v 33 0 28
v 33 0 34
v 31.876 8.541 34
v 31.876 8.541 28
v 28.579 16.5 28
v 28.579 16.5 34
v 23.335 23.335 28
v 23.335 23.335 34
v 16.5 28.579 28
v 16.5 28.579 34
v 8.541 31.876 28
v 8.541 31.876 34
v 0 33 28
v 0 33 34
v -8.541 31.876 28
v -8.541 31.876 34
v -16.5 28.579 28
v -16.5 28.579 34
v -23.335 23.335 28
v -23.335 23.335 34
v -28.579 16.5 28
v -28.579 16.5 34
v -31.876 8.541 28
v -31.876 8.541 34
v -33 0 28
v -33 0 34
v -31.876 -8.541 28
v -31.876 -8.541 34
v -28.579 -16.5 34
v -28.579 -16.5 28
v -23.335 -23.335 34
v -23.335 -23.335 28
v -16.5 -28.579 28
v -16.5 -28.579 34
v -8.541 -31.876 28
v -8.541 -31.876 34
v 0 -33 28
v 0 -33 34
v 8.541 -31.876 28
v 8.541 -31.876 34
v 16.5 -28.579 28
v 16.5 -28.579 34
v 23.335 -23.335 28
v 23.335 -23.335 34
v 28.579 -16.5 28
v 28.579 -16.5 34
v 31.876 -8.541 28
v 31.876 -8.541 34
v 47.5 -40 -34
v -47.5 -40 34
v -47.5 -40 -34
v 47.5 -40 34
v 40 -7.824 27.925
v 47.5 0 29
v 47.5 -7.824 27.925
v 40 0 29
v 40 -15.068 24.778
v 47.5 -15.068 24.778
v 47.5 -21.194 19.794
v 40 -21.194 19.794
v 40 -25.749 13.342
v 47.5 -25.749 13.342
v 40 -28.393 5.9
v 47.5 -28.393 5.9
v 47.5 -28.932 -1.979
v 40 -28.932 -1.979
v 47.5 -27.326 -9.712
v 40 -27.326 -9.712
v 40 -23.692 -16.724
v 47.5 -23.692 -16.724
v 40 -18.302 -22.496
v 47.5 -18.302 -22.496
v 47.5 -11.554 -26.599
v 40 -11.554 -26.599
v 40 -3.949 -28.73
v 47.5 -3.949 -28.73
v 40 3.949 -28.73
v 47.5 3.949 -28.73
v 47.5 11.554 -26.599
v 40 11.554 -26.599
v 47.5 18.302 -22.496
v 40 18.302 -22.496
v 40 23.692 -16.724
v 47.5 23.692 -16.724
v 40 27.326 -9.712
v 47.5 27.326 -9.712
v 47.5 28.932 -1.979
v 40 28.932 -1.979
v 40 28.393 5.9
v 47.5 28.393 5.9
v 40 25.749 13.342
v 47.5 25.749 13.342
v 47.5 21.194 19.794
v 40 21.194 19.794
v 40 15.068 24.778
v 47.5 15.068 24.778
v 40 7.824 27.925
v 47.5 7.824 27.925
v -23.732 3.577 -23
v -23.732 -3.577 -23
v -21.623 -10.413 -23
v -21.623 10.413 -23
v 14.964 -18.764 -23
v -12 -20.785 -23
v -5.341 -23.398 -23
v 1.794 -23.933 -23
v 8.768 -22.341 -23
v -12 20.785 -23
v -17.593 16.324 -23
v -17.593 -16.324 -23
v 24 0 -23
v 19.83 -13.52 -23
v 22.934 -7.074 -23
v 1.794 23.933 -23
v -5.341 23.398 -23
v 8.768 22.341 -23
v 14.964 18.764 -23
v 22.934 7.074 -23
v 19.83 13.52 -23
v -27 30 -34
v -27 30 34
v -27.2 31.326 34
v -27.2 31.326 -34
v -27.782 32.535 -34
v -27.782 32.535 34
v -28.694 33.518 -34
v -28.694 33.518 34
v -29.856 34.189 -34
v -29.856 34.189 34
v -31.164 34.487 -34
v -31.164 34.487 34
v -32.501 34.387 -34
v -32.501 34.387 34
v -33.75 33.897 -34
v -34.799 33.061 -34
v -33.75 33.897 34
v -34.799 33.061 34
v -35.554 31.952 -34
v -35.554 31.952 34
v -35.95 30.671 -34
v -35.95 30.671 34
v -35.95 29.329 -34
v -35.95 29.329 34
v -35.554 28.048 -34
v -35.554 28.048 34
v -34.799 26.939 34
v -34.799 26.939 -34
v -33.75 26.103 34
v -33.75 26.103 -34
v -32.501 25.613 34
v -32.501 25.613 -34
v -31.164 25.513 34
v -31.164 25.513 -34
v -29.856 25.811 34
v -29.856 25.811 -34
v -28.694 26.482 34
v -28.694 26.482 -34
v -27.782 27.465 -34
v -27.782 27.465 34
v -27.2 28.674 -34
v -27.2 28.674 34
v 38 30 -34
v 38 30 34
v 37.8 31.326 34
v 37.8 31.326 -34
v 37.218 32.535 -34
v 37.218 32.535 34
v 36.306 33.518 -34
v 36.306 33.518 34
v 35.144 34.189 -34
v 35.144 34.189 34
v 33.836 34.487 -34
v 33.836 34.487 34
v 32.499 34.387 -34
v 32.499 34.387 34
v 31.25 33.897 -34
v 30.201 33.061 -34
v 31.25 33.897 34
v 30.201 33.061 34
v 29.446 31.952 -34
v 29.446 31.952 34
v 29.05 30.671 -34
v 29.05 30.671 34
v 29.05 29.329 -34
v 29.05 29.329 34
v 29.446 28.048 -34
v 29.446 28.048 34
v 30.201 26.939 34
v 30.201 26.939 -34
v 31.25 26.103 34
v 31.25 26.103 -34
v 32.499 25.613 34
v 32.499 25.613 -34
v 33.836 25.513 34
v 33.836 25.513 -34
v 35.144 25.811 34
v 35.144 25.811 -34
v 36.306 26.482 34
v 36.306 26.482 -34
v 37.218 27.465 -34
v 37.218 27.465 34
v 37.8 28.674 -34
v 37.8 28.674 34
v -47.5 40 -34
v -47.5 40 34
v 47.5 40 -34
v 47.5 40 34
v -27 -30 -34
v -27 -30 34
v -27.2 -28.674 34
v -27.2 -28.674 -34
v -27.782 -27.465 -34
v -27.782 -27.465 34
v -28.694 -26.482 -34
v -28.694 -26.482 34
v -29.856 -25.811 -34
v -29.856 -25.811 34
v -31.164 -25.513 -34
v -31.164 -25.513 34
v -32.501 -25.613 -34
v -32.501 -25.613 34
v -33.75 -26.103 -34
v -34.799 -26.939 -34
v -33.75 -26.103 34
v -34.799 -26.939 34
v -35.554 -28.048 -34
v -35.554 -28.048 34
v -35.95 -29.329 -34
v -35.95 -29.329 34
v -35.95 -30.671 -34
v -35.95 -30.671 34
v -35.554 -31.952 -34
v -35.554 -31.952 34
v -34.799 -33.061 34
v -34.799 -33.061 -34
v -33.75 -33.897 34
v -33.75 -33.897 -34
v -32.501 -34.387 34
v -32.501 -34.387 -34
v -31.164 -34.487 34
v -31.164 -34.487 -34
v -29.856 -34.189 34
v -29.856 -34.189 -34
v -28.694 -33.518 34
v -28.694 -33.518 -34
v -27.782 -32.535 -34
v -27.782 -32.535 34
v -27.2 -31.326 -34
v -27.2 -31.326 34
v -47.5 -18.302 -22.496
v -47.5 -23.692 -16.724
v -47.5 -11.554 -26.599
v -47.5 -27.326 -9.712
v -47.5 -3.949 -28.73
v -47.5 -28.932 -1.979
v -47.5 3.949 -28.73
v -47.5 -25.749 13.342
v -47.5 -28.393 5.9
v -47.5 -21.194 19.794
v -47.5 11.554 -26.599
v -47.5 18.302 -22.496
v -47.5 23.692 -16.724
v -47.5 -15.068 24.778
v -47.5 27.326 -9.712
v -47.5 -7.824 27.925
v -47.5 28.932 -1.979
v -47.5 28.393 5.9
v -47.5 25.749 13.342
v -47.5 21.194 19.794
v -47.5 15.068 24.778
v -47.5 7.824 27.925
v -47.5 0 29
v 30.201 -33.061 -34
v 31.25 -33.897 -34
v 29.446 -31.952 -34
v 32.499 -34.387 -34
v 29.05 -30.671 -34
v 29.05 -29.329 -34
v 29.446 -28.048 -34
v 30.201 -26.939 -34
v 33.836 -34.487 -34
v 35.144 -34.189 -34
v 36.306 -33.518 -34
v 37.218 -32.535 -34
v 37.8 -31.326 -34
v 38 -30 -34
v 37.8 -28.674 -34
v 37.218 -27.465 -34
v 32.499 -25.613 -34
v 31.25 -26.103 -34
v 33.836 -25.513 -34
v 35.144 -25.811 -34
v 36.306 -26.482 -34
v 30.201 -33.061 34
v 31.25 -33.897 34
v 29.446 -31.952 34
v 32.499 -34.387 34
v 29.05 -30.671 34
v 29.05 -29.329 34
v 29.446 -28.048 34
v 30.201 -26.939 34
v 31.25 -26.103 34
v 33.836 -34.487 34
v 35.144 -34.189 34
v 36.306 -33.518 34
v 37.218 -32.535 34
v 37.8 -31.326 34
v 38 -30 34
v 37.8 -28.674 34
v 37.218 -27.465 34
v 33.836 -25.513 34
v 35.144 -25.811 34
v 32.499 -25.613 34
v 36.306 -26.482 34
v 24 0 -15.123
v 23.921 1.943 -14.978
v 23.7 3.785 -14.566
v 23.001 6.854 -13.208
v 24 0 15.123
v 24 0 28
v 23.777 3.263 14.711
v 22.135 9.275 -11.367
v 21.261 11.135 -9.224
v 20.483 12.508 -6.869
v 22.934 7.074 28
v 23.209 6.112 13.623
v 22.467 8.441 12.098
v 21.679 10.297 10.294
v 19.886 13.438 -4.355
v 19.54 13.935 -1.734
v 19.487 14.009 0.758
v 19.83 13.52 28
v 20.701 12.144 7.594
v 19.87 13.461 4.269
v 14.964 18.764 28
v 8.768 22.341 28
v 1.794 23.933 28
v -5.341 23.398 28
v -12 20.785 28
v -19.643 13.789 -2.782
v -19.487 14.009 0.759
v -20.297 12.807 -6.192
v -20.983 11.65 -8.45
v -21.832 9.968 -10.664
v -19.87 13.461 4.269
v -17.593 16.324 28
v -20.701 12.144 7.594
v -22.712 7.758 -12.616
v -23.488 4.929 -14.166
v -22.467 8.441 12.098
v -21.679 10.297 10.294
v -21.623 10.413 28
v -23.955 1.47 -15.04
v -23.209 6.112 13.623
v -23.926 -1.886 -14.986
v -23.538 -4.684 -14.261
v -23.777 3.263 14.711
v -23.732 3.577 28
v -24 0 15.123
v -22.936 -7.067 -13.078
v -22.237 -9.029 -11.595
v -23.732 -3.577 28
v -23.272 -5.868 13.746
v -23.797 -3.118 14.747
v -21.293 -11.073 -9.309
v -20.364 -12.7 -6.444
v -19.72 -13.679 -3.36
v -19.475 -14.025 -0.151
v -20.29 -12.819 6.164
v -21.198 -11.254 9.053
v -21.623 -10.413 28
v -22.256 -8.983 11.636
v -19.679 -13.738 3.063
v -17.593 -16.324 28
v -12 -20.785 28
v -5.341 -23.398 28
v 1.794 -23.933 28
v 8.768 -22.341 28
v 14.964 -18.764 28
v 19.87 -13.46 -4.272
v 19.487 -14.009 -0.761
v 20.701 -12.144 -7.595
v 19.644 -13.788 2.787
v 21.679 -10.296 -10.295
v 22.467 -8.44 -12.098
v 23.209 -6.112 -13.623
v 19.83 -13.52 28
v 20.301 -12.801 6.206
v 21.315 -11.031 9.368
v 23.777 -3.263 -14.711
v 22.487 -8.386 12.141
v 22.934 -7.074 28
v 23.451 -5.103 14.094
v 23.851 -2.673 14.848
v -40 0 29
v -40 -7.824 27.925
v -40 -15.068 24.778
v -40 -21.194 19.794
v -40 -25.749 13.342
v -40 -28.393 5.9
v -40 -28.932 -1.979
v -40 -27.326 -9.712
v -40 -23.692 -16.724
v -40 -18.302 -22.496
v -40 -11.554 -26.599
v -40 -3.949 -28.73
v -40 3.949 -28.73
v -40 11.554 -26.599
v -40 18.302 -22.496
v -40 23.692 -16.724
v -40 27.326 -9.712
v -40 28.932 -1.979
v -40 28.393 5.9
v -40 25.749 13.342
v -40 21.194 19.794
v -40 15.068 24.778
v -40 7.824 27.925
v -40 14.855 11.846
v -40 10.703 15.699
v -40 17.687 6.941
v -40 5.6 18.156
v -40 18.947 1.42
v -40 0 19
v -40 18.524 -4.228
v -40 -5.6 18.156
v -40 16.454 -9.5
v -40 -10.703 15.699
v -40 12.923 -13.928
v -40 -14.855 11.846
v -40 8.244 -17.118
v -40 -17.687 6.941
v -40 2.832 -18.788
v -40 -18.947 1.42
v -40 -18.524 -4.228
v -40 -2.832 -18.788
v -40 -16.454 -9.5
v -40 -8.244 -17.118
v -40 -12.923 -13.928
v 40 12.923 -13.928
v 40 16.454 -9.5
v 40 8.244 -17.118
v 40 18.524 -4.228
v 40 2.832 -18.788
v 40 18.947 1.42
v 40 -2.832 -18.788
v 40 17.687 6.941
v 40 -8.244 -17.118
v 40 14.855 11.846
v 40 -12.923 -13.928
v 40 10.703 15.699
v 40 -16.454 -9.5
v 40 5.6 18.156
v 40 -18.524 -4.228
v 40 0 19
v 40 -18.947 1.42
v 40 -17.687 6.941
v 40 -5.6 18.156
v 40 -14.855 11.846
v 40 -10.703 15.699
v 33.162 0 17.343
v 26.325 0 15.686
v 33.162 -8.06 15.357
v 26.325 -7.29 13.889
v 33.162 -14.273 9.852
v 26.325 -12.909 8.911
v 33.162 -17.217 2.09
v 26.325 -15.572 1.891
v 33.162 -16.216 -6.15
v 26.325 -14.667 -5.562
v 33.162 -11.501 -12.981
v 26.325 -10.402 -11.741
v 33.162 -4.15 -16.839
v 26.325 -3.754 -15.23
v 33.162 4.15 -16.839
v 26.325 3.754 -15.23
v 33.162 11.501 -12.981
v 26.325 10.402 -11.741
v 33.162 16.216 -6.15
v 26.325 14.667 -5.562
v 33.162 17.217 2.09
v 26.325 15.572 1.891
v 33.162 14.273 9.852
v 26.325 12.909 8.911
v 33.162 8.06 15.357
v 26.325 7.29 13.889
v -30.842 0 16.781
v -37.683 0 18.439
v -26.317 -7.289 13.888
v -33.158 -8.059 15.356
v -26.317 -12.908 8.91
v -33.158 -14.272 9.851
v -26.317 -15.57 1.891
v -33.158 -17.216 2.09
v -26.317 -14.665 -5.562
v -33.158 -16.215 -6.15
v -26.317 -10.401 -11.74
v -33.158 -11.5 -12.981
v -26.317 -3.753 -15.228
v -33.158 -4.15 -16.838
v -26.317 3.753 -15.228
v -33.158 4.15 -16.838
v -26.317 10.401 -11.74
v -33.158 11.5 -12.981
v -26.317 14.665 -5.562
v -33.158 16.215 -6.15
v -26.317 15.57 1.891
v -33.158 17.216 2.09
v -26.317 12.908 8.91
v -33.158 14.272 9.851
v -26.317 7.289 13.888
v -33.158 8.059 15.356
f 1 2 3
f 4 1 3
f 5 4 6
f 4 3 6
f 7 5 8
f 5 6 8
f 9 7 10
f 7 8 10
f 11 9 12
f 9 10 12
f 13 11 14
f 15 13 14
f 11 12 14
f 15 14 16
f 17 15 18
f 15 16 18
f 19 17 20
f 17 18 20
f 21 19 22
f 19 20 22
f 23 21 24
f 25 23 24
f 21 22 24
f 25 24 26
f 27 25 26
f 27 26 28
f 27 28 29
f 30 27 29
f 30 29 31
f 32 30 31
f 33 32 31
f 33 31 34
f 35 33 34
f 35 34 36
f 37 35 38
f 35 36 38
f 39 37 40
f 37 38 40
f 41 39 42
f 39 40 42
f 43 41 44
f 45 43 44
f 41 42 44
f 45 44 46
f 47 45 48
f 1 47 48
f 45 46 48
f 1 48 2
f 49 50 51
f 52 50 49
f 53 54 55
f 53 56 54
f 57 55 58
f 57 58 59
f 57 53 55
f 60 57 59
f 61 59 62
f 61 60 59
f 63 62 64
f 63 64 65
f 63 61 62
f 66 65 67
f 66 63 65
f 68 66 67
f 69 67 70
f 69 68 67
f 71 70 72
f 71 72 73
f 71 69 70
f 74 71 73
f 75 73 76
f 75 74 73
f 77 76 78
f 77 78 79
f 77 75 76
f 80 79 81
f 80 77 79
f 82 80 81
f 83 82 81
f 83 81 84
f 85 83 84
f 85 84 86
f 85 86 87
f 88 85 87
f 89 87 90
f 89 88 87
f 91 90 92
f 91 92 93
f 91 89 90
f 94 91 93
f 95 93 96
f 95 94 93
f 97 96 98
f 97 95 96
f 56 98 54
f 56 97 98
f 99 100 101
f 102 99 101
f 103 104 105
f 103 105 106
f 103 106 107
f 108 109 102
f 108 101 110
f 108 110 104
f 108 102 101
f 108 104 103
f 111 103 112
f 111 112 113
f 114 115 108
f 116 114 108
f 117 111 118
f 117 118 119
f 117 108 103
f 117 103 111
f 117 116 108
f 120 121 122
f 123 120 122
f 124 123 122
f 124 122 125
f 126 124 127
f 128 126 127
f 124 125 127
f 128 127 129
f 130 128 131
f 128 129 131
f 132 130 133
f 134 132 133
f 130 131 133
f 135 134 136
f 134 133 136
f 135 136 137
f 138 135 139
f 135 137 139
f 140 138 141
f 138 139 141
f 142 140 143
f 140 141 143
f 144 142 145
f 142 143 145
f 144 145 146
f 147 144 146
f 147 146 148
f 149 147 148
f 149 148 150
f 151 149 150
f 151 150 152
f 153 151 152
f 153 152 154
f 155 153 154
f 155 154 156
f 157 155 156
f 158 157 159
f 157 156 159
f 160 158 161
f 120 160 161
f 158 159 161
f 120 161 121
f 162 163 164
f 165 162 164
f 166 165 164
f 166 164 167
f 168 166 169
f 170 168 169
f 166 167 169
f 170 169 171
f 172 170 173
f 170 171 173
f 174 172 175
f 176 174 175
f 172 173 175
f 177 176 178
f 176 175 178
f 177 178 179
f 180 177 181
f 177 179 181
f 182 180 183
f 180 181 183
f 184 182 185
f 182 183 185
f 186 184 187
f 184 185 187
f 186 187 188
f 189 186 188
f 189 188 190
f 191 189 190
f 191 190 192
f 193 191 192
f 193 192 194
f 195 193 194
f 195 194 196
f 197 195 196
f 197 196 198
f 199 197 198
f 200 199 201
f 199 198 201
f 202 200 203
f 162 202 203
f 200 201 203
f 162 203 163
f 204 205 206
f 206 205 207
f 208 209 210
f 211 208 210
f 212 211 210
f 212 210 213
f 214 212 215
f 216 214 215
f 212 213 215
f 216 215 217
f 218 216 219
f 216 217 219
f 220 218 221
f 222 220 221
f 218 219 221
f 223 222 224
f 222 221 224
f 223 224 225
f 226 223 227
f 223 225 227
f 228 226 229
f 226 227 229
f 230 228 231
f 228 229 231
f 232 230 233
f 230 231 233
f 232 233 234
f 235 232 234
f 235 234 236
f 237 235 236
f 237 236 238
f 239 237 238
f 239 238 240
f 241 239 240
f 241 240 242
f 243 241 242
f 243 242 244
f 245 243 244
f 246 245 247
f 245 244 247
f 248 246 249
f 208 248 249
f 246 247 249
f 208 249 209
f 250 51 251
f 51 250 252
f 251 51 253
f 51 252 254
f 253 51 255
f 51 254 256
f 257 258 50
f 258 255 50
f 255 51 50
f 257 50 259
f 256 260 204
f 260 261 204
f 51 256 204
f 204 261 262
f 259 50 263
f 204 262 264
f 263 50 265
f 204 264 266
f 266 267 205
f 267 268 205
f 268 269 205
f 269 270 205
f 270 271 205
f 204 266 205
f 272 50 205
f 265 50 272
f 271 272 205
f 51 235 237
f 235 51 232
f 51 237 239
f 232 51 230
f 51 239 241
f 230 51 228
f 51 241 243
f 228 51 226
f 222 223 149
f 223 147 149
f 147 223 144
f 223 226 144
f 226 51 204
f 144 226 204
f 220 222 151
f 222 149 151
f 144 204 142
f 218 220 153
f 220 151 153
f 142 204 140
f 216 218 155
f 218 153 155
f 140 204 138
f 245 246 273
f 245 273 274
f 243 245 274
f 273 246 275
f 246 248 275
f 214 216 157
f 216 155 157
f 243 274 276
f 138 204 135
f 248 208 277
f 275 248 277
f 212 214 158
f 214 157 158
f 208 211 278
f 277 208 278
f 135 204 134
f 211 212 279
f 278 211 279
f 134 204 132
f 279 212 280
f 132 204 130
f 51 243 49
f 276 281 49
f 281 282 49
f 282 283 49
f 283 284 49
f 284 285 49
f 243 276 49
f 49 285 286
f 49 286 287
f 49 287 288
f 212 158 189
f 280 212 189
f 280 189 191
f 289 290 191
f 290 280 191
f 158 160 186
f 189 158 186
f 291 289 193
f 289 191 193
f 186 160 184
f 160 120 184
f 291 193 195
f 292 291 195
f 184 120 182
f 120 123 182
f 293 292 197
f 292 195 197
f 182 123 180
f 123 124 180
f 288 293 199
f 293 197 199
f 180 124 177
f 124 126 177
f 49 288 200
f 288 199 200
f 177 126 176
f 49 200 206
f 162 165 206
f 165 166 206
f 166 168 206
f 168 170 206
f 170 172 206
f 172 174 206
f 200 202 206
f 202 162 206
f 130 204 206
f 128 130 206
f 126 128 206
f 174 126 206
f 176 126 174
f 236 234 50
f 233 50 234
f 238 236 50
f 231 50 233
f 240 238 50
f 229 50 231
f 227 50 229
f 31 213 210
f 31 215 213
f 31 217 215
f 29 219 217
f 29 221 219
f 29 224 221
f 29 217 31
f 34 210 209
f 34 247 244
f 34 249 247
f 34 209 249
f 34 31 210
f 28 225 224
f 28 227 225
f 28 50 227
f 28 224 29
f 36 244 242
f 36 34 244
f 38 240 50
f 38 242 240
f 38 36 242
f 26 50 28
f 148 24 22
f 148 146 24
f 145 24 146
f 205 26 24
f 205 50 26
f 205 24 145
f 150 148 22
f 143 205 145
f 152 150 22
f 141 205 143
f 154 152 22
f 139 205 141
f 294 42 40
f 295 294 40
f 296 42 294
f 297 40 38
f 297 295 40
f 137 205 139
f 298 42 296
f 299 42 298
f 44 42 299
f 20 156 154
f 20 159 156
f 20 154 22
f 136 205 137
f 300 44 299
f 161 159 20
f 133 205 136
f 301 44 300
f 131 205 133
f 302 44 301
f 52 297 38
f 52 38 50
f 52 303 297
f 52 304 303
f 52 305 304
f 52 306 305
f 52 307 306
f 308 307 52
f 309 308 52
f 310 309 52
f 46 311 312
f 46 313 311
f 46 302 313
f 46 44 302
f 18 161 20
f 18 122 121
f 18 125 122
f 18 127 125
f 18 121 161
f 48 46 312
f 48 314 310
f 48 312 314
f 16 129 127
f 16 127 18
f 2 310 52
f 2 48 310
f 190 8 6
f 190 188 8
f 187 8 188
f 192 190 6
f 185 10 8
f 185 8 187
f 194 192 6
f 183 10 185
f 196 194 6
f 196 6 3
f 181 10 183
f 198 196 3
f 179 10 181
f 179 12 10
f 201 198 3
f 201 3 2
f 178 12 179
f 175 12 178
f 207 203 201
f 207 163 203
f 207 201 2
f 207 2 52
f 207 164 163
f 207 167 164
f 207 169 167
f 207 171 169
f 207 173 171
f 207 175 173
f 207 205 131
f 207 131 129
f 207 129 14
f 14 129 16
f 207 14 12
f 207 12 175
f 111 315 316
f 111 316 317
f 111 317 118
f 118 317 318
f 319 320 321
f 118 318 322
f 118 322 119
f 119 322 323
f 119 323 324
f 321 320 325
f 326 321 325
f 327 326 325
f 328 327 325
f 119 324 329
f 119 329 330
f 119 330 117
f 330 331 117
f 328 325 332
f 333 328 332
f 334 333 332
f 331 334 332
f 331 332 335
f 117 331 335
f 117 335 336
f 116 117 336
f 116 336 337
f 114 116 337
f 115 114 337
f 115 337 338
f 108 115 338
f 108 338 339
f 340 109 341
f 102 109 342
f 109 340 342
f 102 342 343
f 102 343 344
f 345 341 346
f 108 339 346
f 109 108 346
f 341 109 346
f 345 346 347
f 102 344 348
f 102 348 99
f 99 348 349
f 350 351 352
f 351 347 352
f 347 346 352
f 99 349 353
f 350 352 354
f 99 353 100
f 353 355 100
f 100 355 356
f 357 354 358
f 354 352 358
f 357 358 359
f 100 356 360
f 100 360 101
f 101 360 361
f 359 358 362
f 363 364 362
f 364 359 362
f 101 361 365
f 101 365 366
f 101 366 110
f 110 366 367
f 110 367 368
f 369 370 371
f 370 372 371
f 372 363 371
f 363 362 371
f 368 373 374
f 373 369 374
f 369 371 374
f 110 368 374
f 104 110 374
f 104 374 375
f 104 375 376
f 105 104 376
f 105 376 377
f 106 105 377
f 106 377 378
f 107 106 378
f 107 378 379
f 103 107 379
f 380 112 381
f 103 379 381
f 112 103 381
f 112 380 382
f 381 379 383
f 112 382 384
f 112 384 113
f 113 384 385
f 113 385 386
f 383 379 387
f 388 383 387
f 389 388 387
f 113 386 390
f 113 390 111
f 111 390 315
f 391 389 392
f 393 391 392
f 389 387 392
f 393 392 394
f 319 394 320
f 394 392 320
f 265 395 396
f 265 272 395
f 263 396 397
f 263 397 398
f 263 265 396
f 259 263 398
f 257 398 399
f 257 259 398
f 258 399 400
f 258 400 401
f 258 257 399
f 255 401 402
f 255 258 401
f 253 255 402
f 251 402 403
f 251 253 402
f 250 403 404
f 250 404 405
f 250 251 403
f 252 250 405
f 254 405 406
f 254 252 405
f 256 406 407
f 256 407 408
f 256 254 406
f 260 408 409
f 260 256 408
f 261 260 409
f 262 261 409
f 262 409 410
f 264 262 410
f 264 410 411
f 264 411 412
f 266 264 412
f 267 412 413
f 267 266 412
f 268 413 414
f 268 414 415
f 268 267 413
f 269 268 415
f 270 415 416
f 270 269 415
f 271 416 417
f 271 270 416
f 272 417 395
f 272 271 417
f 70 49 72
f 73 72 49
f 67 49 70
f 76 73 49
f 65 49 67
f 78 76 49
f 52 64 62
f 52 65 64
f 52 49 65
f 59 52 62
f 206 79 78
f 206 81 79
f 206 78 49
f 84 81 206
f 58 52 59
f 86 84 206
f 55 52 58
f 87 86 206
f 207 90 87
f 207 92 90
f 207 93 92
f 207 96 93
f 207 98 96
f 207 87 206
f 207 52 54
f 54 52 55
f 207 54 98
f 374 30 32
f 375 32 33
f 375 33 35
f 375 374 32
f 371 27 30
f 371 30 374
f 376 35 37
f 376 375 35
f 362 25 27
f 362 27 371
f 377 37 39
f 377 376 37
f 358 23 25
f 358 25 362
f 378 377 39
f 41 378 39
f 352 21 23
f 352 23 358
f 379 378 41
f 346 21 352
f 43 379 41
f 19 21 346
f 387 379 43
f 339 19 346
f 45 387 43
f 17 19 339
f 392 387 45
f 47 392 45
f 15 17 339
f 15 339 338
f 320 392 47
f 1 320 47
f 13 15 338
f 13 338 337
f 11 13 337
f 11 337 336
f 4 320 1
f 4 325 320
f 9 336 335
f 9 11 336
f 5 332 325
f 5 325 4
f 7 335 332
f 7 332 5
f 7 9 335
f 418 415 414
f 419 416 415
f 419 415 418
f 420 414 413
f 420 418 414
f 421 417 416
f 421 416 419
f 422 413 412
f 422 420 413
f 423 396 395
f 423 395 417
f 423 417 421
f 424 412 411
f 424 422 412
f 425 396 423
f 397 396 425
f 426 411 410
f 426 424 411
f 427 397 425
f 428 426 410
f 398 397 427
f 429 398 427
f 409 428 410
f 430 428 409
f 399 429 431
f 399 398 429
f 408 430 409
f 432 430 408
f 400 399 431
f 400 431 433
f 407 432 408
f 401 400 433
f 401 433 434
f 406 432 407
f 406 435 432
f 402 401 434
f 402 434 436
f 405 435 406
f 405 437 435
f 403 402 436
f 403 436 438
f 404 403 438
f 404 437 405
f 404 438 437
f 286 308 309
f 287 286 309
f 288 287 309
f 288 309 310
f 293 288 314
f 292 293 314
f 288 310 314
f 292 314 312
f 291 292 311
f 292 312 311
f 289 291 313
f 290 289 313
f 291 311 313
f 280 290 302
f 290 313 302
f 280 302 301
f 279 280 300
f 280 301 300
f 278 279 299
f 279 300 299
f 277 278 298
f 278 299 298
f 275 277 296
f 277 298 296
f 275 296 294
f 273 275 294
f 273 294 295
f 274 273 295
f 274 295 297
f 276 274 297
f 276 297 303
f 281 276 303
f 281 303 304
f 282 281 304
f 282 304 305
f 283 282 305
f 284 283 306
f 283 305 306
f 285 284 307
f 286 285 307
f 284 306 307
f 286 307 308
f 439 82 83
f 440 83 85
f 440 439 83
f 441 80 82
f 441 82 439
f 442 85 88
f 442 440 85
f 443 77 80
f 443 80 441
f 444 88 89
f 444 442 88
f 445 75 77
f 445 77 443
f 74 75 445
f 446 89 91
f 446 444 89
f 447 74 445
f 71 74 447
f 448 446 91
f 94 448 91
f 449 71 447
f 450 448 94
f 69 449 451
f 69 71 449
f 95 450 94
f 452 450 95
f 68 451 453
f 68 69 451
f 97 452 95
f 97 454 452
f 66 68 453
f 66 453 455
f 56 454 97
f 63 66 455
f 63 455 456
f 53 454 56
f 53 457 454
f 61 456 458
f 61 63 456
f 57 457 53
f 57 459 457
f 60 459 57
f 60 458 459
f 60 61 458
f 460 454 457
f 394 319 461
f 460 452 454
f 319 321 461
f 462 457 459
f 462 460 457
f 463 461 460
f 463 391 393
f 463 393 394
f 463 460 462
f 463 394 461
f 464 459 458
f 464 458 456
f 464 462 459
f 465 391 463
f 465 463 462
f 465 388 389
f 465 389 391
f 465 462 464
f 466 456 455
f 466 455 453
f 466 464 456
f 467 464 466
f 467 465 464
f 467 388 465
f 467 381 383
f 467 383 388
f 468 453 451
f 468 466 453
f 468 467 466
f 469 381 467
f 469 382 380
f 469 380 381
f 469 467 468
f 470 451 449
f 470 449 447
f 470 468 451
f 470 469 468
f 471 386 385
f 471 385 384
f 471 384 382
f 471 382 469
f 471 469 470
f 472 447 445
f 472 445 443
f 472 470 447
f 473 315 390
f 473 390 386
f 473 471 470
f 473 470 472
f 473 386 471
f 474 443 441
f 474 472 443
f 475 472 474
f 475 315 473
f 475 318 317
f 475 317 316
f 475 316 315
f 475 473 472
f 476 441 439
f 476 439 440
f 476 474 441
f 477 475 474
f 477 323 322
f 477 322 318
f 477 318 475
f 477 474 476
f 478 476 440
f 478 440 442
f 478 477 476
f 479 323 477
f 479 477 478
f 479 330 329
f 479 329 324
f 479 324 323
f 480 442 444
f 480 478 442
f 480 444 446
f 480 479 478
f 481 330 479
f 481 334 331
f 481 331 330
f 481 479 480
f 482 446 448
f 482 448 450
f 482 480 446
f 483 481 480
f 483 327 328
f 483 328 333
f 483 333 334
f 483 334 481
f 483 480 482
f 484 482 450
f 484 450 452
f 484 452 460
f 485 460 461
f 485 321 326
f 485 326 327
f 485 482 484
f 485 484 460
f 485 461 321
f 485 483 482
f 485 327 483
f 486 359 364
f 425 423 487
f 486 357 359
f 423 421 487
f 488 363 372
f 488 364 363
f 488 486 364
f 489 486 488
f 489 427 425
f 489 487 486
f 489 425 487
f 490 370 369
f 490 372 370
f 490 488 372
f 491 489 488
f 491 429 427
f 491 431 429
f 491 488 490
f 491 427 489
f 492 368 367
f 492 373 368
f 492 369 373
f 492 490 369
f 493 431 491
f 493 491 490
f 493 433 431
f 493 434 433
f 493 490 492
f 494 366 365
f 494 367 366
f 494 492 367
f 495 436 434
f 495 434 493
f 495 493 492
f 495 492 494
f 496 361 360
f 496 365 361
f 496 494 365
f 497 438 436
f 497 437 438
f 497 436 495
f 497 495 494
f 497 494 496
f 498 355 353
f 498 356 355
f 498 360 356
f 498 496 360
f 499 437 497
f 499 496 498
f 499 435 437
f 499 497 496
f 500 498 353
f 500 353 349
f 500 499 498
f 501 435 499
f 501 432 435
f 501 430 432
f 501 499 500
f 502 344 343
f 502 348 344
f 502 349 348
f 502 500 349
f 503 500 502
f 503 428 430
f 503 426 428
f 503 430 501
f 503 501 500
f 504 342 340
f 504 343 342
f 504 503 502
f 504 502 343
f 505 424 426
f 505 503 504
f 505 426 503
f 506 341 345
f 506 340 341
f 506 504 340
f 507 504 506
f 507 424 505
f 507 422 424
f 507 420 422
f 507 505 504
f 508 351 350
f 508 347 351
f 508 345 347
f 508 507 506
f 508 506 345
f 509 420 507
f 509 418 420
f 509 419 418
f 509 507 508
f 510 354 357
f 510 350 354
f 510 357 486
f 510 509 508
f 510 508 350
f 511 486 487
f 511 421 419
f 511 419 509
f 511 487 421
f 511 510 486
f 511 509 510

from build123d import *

# Parameters (mm, degrees)
F0_W     = 95
F0_H     = 80
F1_DEPTH = 34
F4_R     = 4.5
F5_DEPTH = 68
F4_R_2   = 24
F6_DEPTH = 57
F4_R_3   = 33
F7_DEPTH = 6


with BuildPart() as f1:
    # F0 (on Top) → F1 (new body, symmetric)
    with BuildSketch(Plane.XY):
        Rectangle(F0_W, F0_H)
    extrude(amount=F1_DEPTH, both=True)

    # F2 (on Front) → F3 (revolve, cut)
    with BuildSketch(Plane.XZ):
        Polygon((47.5, 0), (47.5, 29), (40, 29), (40, 19), (10, 11.730042), (-10, 11.730042), (-40, 19), (-40, 29), (-47.5, 29), (-47.5, 0), align=None)
    revolve(axis=Axis((-0.459014, 0, 0), (1, 0, 0)), mode=Mode.SUBTRACT)

    # F4 (on face) → F5 (cut)
    with BuildSketch(Plane.XY.offset(34)):
        with Locations((-31.5, 30)):
            Circle(F4_R)
        with Locations((33.5, 30)):
            Circle(F4_R)
        with Locations((-31.5, -30)):
            Circle(F4_R)
        with Locations((33.5, -30)):
            Circle(F4_R)
    extrude(amount=-F5_DEPTH, mode=Mode.SUBTRACT)

    # F4 (on face) → F6 (cut)
    with BuildSketch(Plane.XY.offset(34)):
        Circle(F4_R_2)
    extrude(amount=-F6_DEPTH, mode=Mode.SUBTRACT)

    # F4 (on face) → F7 (cut)
    with BuildSketch(Plane.XY.offset(34)):
        Circle(F4_R_3)
        Circle(F4_R_2, mode=Mode.SUBTRACT)
    extrude(amount=-F7_DEPTH, mode=Mode.SUBTRACT)


solid = f1.part
